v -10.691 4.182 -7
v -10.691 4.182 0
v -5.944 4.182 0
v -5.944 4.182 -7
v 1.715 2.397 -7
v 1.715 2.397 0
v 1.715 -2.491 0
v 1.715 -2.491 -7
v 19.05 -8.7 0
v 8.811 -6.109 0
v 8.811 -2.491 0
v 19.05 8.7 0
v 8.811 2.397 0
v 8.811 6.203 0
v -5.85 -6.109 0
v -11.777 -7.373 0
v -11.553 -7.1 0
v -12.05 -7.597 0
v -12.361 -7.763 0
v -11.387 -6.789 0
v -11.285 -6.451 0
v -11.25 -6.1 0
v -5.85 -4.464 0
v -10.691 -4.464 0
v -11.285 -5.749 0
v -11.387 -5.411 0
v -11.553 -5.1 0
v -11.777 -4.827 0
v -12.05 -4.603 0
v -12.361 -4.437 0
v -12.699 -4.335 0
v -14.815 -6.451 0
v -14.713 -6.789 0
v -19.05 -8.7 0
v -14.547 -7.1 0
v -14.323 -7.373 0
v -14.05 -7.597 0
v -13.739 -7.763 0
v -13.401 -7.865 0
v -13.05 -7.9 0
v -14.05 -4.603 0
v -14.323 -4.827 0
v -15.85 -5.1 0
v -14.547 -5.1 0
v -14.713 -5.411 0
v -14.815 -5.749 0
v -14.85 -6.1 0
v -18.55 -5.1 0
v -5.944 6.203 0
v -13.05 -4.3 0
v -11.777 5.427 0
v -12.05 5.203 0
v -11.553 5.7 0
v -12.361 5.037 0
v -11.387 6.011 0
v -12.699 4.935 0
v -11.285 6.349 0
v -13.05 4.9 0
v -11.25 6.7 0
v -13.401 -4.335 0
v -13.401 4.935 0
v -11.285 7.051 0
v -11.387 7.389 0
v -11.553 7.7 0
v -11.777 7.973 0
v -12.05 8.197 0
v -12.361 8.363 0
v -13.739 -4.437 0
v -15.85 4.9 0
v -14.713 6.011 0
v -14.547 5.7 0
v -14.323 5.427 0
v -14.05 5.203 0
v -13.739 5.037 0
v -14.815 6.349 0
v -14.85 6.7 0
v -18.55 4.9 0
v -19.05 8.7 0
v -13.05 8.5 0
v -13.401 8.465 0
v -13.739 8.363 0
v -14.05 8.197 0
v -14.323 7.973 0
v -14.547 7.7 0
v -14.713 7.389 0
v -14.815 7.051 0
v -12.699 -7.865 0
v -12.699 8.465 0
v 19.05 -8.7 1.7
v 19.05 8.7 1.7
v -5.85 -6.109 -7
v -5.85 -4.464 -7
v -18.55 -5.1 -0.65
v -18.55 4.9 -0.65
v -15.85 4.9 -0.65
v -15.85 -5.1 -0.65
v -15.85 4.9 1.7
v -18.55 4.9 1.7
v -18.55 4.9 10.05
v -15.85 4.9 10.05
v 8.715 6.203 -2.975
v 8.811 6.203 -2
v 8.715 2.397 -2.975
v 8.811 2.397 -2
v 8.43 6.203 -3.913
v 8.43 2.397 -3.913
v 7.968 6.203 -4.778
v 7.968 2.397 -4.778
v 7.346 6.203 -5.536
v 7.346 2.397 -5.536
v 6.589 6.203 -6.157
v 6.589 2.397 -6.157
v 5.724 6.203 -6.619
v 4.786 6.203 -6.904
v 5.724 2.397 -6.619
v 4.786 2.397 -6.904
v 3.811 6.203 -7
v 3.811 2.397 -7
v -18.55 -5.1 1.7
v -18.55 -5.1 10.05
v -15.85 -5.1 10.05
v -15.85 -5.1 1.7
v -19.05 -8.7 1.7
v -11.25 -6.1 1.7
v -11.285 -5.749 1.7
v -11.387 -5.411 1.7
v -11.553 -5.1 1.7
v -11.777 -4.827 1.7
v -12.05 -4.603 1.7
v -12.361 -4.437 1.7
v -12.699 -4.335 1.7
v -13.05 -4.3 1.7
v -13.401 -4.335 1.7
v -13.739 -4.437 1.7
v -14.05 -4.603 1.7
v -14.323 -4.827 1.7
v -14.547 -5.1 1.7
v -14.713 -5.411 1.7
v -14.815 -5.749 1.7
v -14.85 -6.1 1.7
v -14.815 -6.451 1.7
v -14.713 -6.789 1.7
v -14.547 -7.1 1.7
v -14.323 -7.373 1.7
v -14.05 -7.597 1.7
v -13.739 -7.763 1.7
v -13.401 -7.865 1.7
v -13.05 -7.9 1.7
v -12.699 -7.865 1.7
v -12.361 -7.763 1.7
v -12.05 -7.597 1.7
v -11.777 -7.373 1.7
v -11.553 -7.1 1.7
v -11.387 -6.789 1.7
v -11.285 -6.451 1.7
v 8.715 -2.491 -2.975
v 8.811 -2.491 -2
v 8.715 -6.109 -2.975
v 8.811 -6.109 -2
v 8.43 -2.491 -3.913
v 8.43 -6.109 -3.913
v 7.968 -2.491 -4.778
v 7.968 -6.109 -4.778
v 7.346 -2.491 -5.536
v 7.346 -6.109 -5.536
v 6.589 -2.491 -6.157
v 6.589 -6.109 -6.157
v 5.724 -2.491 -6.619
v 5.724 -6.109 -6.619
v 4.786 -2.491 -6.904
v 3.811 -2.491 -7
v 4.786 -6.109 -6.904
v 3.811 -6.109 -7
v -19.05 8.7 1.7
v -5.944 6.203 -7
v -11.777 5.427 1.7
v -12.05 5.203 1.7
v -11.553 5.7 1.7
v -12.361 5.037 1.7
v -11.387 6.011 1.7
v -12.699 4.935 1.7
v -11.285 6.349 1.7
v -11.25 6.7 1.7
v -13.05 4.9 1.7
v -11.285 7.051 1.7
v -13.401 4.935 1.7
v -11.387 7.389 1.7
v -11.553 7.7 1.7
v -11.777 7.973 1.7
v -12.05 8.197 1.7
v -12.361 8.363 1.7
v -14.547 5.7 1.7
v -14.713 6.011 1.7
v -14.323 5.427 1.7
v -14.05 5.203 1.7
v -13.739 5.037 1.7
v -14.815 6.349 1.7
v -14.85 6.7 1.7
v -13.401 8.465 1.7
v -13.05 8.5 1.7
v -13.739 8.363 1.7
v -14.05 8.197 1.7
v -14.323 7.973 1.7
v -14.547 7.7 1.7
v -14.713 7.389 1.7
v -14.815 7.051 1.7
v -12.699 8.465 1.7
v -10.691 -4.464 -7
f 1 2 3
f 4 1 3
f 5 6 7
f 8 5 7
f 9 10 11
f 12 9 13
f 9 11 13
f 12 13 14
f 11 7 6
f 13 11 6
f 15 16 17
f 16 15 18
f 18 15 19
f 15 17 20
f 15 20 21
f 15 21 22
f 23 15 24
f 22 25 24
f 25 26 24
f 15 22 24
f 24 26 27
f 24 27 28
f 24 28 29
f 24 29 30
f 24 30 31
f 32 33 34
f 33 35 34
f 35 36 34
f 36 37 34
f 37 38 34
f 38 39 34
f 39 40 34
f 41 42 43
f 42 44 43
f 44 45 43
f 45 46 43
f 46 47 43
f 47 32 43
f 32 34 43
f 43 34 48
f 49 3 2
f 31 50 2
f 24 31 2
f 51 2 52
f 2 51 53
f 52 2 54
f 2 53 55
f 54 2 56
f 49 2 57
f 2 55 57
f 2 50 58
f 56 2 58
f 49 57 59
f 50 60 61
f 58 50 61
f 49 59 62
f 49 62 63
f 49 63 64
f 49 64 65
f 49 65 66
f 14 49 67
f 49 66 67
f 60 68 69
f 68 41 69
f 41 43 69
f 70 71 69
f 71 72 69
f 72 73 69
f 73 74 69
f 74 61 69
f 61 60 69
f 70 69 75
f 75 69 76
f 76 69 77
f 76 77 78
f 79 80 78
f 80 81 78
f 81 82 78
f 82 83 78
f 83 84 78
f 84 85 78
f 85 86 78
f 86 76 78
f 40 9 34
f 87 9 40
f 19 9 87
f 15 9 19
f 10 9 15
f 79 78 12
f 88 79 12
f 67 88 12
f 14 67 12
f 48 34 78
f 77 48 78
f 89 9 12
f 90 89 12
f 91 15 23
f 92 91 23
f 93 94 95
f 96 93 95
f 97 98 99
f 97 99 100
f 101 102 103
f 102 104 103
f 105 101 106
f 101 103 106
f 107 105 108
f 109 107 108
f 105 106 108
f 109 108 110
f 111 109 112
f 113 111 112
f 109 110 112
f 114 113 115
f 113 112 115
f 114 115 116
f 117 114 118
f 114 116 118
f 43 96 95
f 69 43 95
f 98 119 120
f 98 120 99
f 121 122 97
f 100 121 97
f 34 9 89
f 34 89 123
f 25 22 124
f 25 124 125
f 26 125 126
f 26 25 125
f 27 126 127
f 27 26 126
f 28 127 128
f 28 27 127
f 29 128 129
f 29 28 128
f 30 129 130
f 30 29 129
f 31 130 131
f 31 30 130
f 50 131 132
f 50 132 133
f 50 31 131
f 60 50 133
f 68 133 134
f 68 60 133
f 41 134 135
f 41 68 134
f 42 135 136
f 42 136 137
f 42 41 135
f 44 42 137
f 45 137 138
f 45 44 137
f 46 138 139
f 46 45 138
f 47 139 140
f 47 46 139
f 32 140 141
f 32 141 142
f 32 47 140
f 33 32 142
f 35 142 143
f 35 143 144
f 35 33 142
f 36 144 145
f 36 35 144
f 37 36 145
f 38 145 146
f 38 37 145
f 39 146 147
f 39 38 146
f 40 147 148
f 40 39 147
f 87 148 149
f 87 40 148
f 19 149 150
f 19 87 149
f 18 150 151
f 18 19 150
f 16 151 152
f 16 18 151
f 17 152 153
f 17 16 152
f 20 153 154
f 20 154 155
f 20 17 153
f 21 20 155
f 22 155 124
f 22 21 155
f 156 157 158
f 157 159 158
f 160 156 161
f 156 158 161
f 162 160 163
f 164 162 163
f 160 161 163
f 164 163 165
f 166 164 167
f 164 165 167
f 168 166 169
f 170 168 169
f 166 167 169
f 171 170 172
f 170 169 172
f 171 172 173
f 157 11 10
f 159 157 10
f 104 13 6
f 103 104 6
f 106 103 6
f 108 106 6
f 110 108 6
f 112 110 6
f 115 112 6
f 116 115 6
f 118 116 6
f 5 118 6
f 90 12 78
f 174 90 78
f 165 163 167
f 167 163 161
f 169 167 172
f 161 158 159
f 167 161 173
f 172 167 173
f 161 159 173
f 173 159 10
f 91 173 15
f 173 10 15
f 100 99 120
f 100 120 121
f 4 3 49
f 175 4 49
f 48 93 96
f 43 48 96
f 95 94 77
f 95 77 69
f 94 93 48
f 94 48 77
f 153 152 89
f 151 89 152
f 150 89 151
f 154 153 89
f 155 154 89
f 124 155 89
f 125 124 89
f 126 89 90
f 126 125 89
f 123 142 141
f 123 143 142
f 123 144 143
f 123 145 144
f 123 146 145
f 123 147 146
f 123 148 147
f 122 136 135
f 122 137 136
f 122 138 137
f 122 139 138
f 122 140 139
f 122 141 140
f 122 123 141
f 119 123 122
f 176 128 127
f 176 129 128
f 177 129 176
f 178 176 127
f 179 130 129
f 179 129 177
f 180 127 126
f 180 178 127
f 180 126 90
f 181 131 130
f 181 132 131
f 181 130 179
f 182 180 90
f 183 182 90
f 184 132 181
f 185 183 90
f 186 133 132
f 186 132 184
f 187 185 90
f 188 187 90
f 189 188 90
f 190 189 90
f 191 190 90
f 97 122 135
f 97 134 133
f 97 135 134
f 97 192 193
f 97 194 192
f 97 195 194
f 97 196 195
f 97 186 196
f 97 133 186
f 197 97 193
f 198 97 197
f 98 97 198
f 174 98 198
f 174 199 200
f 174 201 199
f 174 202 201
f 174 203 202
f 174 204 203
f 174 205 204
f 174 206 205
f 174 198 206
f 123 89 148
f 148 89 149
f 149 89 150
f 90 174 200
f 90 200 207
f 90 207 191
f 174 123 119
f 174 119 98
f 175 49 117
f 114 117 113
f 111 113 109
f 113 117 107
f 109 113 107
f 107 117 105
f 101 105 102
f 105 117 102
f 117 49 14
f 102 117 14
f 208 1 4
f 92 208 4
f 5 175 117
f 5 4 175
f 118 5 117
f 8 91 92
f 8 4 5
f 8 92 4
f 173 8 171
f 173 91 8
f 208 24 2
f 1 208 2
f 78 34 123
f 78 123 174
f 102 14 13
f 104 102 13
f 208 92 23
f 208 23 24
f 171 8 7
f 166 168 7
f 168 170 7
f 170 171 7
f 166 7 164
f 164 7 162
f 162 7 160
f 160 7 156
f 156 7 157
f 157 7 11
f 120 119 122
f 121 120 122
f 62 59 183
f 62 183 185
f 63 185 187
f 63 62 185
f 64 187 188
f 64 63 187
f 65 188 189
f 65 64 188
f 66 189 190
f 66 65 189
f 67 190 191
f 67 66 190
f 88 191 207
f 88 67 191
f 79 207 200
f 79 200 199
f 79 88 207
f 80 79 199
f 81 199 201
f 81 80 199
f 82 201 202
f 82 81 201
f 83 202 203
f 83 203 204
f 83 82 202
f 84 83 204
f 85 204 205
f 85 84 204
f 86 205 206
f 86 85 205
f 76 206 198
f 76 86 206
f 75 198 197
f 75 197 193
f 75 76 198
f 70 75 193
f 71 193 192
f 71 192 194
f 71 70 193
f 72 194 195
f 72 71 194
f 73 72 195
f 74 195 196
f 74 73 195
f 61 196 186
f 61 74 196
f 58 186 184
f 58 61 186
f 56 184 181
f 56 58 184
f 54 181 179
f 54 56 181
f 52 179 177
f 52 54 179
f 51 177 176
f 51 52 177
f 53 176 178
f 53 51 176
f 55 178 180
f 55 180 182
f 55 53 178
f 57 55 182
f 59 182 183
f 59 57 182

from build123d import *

# Parameters (mm, degrees)
CROQUIS1_W                   = 17.4
CROQUIS1_H                   = 38.1
CROQUIS1_R                   = 1.8
SALIENTE_EXTRUIR1_DEPTH      = 1.7
SALIENTE_EXTRUIR2_DEPTH      = 8.35
SALIENTE_EXTRUIR2_DEPTH_BACK = 2.35
CROQUIS2_W                   = 2.7
CROQUIS2_H                   = 10
SALIENTE_EXTRUIR3_DEPTH      = 7
REDONDEO2_R                  = 5


with BuildPart() as part:
    # Croquis1 → Saliente-Extruir1 (new body)
    with BuildSketch(Plane(origin=(0, 0, 0), x_dir=(0, 1, 0), z_dir=(0, 0, 1))):
        Rectangle(CROQUIS1_W, CROQUIS1_H)
        with Locations(Location((6.7, 13.05, 0), (0, 0, 270))):
            Circle(CROQUIS1_R, mode=Mode.SUBTRACT)
        with Locations(Location((-6.1, 13.05, 0), (0, 0, 270))):
            Circle(CROQUIS1_R, mode=Mode.SUBTRACT)
    extrude(amount=SALIENTE_EXTRUIR1_DEPTH)

    # Croquis2 → Saliente-Extruir2 (add, two sides: drawn at the far end of the back side and taken through both)
    with BuildSketch(Plane.XY.offset(1.7).offset(-SALIENTE_EXTRUIR2_DEPTH_BACK)):
        with Locations((-17.2, -0.1)):
            Rectangle(CROQUIS2_W, CROQUIS2_H)
    extrude(amount=SALIENTE_EXTRUIR2_DEPTH + SALIENTE_EXTRUIR2_DEPTH_BACK)

    # Croquis3 → Saliente-Extruir3 (add)
    with BuildSketch(Plane(origin=(0, 0, 0), x_dir=(1, 0, 0), z_dir=(0, 0, -1))):
        Polygon((-10.690625063, -4.182266508), (-5.944457453, -4.182266508), (-5.944457453, -6.202912125), (8.810954722, -6.202912125), (8.810954722, -2.396579685), (1.715199186, -2.396579685), (1.715199186, 2.490563202), (8.810954722, 2.490563202), (8.810954722, 6.108928608), (-5.850473936, 6.108928608), (-5.850473936, 4.464217059), (-10.690625063, 4.464217059), align=None)
    extrude(amount=SALIENTE_EXTRUIR3_DEPTH)

    # Redondeo2
    redondeo2_edges = [part.edges().sort_by_distance(p)[0] for p in [
        (8.810954722, 4.299745905, -7),
        (8.810954722, -4.299745905, -7),
    ]]
    fillet(redondeo2_edges, radius=REDONDEO2_R)


solid = part.part
